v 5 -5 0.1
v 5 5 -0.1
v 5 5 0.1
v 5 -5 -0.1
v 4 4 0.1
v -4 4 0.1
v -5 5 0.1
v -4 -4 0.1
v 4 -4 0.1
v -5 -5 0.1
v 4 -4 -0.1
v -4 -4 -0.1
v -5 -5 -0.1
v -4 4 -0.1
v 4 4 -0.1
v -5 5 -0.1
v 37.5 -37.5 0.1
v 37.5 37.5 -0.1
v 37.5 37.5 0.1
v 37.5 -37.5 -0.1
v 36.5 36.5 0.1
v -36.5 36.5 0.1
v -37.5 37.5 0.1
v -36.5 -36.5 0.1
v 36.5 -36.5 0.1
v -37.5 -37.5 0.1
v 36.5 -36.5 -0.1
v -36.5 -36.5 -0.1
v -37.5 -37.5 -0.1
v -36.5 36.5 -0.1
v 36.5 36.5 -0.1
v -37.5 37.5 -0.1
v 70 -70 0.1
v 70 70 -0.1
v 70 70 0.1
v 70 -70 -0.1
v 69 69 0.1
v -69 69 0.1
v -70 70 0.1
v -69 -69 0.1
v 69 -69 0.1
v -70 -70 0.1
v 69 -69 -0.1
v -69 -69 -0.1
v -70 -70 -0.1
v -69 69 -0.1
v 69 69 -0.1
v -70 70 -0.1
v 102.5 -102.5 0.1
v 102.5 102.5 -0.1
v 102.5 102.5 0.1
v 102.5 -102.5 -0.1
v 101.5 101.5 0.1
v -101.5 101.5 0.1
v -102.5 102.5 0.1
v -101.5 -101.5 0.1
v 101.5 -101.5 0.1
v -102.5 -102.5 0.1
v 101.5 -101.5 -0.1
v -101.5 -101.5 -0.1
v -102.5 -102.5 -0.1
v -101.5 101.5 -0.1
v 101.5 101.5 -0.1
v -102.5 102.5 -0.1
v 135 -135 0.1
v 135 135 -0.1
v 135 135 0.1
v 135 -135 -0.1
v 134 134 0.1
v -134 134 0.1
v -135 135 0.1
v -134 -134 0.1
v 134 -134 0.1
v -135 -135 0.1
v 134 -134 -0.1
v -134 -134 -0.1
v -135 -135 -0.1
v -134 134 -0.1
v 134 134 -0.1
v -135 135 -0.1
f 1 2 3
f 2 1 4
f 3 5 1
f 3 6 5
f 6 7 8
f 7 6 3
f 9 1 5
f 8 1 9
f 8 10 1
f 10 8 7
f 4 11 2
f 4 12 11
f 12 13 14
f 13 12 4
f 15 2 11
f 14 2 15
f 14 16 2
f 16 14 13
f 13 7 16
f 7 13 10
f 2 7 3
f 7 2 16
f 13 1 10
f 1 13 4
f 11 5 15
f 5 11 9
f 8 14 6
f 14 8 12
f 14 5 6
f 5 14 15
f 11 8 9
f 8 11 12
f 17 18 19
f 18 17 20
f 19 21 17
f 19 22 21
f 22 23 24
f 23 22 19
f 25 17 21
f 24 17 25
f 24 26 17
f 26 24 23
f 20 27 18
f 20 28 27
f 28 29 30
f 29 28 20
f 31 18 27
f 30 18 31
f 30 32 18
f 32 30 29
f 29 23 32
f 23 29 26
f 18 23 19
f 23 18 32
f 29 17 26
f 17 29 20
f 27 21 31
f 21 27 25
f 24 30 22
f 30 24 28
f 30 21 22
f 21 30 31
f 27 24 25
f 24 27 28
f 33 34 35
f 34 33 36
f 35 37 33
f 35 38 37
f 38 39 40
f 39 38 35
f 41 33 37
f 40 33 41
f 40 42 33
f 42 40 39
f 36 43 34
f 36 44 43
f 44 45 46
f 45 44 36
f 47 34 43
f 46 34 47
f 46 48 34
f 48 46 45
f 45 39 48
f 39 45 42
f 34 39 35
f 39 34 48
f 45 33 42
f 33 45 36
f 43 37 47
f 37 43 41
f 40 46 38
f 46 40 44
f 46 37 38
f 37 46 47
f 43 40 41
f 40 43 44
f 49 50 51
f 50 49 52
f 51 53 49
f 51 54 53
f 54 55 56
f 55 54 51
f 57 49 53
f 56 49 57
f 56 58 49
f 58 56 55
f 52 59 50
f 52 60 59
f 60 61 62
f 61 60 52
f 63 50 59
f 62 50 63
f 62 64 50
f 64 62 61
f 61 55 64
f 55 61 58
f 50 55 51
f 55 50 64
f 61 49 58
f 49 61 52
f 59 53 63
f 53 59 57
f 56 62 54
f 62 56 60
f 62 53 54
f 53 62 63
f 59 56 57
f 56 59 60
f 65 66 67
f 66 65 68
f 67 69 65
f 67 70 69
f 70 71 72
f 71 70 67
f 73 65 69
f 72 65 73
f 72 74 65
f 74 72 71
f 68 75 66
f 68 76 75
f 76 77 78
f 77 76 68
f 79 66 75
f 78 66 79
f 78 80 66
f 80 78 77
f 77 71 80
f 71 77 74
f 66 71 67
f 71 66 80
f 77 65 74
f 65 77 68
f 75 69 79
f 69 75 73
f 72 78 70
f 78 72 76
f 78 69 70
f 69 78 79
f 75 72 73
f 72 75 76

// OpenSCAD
startingHeight = .2;
startingWidth = 10;
boxThickness = 1;
boxSpacing = 65;
boxCount = 5;

for (i = [0 : boxCount-1] ){
    echo(i);
    thisWidth = startingWidth +(boxSpacing * i);

    difference(){
        cube([thisWidth, thisWidth, startingHeight], center=true);
        cube([thisWidth-boxThickness*2, thisWidth-boxThickness*2, startingHeight+2], center=true);
    }
}
